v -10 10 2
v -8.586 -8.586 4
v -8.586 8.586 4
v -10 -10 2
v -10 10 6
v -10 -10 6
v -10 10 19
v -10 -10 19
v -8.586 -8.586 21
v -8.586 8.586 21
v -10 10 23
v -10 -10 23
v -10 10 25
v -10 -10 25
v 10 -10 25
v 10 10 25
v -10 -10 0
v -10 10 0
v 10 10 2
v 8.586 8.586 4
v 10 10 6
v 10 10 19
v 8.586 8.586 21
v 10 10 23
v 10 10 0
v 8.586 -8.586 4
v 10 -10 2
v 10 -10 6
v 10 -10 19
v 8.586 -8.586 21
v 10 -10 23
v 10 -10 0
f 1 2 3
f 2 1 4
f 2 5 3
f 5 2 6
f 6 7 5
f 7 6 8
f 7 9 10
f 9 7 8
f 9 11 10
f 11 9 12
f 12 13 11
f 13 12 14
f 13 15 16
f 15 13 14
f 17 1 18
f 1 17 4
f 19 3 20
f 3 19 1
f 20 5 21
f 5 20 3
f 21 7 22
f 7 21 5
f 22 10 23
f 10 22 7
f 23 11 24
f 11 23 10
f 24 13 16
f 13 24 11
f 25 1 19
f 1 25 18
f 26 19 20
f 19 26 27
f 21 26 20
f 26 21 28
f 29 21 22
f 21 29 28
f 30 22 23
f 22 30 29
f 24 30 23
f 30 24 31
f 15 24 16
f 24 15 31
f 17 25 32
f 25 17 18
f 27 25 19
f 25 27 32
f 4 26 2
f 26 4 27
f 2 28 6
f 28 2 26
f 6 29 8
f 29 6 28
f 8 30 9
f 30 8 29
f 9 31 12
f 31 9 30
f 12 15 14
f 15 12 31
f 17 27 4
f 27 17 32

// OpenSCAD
H=25;
L=20*sqrt(2);
l=4/sqrt(2);

module bloco(){
	rotate(45)
	rotate_extrude($fn=4)
	difference(){
		square([L/2,H]);

		translate([L/2,l*sqrt(2)])
		rotate(45) square([l,l], center=true);
	
		translate([L/2,H-l*sqrt(2)])
		rotate(45) square([l,l], center=true);
	}
}

module camada(nome, e, p=1){
		for (i=[0:3]){
			rotate(i*90)
			translate([-7.5,10+e-p,5])
			rotate([90,0])
			linear_extrude(height=e)
			import("rat.dxf", layer=nome);
		}
}

union(){
	difference(){
		bloco();
		camada("cabeca", 1, p=1-0.1);
	}
	camada("olhos", 0.5);
	camada("boca", 1);
	camada("boca2", 1.5);
	camada("bigode", 0.5);
	camada("focinho", 2);
	camada("dente", 2);
}
